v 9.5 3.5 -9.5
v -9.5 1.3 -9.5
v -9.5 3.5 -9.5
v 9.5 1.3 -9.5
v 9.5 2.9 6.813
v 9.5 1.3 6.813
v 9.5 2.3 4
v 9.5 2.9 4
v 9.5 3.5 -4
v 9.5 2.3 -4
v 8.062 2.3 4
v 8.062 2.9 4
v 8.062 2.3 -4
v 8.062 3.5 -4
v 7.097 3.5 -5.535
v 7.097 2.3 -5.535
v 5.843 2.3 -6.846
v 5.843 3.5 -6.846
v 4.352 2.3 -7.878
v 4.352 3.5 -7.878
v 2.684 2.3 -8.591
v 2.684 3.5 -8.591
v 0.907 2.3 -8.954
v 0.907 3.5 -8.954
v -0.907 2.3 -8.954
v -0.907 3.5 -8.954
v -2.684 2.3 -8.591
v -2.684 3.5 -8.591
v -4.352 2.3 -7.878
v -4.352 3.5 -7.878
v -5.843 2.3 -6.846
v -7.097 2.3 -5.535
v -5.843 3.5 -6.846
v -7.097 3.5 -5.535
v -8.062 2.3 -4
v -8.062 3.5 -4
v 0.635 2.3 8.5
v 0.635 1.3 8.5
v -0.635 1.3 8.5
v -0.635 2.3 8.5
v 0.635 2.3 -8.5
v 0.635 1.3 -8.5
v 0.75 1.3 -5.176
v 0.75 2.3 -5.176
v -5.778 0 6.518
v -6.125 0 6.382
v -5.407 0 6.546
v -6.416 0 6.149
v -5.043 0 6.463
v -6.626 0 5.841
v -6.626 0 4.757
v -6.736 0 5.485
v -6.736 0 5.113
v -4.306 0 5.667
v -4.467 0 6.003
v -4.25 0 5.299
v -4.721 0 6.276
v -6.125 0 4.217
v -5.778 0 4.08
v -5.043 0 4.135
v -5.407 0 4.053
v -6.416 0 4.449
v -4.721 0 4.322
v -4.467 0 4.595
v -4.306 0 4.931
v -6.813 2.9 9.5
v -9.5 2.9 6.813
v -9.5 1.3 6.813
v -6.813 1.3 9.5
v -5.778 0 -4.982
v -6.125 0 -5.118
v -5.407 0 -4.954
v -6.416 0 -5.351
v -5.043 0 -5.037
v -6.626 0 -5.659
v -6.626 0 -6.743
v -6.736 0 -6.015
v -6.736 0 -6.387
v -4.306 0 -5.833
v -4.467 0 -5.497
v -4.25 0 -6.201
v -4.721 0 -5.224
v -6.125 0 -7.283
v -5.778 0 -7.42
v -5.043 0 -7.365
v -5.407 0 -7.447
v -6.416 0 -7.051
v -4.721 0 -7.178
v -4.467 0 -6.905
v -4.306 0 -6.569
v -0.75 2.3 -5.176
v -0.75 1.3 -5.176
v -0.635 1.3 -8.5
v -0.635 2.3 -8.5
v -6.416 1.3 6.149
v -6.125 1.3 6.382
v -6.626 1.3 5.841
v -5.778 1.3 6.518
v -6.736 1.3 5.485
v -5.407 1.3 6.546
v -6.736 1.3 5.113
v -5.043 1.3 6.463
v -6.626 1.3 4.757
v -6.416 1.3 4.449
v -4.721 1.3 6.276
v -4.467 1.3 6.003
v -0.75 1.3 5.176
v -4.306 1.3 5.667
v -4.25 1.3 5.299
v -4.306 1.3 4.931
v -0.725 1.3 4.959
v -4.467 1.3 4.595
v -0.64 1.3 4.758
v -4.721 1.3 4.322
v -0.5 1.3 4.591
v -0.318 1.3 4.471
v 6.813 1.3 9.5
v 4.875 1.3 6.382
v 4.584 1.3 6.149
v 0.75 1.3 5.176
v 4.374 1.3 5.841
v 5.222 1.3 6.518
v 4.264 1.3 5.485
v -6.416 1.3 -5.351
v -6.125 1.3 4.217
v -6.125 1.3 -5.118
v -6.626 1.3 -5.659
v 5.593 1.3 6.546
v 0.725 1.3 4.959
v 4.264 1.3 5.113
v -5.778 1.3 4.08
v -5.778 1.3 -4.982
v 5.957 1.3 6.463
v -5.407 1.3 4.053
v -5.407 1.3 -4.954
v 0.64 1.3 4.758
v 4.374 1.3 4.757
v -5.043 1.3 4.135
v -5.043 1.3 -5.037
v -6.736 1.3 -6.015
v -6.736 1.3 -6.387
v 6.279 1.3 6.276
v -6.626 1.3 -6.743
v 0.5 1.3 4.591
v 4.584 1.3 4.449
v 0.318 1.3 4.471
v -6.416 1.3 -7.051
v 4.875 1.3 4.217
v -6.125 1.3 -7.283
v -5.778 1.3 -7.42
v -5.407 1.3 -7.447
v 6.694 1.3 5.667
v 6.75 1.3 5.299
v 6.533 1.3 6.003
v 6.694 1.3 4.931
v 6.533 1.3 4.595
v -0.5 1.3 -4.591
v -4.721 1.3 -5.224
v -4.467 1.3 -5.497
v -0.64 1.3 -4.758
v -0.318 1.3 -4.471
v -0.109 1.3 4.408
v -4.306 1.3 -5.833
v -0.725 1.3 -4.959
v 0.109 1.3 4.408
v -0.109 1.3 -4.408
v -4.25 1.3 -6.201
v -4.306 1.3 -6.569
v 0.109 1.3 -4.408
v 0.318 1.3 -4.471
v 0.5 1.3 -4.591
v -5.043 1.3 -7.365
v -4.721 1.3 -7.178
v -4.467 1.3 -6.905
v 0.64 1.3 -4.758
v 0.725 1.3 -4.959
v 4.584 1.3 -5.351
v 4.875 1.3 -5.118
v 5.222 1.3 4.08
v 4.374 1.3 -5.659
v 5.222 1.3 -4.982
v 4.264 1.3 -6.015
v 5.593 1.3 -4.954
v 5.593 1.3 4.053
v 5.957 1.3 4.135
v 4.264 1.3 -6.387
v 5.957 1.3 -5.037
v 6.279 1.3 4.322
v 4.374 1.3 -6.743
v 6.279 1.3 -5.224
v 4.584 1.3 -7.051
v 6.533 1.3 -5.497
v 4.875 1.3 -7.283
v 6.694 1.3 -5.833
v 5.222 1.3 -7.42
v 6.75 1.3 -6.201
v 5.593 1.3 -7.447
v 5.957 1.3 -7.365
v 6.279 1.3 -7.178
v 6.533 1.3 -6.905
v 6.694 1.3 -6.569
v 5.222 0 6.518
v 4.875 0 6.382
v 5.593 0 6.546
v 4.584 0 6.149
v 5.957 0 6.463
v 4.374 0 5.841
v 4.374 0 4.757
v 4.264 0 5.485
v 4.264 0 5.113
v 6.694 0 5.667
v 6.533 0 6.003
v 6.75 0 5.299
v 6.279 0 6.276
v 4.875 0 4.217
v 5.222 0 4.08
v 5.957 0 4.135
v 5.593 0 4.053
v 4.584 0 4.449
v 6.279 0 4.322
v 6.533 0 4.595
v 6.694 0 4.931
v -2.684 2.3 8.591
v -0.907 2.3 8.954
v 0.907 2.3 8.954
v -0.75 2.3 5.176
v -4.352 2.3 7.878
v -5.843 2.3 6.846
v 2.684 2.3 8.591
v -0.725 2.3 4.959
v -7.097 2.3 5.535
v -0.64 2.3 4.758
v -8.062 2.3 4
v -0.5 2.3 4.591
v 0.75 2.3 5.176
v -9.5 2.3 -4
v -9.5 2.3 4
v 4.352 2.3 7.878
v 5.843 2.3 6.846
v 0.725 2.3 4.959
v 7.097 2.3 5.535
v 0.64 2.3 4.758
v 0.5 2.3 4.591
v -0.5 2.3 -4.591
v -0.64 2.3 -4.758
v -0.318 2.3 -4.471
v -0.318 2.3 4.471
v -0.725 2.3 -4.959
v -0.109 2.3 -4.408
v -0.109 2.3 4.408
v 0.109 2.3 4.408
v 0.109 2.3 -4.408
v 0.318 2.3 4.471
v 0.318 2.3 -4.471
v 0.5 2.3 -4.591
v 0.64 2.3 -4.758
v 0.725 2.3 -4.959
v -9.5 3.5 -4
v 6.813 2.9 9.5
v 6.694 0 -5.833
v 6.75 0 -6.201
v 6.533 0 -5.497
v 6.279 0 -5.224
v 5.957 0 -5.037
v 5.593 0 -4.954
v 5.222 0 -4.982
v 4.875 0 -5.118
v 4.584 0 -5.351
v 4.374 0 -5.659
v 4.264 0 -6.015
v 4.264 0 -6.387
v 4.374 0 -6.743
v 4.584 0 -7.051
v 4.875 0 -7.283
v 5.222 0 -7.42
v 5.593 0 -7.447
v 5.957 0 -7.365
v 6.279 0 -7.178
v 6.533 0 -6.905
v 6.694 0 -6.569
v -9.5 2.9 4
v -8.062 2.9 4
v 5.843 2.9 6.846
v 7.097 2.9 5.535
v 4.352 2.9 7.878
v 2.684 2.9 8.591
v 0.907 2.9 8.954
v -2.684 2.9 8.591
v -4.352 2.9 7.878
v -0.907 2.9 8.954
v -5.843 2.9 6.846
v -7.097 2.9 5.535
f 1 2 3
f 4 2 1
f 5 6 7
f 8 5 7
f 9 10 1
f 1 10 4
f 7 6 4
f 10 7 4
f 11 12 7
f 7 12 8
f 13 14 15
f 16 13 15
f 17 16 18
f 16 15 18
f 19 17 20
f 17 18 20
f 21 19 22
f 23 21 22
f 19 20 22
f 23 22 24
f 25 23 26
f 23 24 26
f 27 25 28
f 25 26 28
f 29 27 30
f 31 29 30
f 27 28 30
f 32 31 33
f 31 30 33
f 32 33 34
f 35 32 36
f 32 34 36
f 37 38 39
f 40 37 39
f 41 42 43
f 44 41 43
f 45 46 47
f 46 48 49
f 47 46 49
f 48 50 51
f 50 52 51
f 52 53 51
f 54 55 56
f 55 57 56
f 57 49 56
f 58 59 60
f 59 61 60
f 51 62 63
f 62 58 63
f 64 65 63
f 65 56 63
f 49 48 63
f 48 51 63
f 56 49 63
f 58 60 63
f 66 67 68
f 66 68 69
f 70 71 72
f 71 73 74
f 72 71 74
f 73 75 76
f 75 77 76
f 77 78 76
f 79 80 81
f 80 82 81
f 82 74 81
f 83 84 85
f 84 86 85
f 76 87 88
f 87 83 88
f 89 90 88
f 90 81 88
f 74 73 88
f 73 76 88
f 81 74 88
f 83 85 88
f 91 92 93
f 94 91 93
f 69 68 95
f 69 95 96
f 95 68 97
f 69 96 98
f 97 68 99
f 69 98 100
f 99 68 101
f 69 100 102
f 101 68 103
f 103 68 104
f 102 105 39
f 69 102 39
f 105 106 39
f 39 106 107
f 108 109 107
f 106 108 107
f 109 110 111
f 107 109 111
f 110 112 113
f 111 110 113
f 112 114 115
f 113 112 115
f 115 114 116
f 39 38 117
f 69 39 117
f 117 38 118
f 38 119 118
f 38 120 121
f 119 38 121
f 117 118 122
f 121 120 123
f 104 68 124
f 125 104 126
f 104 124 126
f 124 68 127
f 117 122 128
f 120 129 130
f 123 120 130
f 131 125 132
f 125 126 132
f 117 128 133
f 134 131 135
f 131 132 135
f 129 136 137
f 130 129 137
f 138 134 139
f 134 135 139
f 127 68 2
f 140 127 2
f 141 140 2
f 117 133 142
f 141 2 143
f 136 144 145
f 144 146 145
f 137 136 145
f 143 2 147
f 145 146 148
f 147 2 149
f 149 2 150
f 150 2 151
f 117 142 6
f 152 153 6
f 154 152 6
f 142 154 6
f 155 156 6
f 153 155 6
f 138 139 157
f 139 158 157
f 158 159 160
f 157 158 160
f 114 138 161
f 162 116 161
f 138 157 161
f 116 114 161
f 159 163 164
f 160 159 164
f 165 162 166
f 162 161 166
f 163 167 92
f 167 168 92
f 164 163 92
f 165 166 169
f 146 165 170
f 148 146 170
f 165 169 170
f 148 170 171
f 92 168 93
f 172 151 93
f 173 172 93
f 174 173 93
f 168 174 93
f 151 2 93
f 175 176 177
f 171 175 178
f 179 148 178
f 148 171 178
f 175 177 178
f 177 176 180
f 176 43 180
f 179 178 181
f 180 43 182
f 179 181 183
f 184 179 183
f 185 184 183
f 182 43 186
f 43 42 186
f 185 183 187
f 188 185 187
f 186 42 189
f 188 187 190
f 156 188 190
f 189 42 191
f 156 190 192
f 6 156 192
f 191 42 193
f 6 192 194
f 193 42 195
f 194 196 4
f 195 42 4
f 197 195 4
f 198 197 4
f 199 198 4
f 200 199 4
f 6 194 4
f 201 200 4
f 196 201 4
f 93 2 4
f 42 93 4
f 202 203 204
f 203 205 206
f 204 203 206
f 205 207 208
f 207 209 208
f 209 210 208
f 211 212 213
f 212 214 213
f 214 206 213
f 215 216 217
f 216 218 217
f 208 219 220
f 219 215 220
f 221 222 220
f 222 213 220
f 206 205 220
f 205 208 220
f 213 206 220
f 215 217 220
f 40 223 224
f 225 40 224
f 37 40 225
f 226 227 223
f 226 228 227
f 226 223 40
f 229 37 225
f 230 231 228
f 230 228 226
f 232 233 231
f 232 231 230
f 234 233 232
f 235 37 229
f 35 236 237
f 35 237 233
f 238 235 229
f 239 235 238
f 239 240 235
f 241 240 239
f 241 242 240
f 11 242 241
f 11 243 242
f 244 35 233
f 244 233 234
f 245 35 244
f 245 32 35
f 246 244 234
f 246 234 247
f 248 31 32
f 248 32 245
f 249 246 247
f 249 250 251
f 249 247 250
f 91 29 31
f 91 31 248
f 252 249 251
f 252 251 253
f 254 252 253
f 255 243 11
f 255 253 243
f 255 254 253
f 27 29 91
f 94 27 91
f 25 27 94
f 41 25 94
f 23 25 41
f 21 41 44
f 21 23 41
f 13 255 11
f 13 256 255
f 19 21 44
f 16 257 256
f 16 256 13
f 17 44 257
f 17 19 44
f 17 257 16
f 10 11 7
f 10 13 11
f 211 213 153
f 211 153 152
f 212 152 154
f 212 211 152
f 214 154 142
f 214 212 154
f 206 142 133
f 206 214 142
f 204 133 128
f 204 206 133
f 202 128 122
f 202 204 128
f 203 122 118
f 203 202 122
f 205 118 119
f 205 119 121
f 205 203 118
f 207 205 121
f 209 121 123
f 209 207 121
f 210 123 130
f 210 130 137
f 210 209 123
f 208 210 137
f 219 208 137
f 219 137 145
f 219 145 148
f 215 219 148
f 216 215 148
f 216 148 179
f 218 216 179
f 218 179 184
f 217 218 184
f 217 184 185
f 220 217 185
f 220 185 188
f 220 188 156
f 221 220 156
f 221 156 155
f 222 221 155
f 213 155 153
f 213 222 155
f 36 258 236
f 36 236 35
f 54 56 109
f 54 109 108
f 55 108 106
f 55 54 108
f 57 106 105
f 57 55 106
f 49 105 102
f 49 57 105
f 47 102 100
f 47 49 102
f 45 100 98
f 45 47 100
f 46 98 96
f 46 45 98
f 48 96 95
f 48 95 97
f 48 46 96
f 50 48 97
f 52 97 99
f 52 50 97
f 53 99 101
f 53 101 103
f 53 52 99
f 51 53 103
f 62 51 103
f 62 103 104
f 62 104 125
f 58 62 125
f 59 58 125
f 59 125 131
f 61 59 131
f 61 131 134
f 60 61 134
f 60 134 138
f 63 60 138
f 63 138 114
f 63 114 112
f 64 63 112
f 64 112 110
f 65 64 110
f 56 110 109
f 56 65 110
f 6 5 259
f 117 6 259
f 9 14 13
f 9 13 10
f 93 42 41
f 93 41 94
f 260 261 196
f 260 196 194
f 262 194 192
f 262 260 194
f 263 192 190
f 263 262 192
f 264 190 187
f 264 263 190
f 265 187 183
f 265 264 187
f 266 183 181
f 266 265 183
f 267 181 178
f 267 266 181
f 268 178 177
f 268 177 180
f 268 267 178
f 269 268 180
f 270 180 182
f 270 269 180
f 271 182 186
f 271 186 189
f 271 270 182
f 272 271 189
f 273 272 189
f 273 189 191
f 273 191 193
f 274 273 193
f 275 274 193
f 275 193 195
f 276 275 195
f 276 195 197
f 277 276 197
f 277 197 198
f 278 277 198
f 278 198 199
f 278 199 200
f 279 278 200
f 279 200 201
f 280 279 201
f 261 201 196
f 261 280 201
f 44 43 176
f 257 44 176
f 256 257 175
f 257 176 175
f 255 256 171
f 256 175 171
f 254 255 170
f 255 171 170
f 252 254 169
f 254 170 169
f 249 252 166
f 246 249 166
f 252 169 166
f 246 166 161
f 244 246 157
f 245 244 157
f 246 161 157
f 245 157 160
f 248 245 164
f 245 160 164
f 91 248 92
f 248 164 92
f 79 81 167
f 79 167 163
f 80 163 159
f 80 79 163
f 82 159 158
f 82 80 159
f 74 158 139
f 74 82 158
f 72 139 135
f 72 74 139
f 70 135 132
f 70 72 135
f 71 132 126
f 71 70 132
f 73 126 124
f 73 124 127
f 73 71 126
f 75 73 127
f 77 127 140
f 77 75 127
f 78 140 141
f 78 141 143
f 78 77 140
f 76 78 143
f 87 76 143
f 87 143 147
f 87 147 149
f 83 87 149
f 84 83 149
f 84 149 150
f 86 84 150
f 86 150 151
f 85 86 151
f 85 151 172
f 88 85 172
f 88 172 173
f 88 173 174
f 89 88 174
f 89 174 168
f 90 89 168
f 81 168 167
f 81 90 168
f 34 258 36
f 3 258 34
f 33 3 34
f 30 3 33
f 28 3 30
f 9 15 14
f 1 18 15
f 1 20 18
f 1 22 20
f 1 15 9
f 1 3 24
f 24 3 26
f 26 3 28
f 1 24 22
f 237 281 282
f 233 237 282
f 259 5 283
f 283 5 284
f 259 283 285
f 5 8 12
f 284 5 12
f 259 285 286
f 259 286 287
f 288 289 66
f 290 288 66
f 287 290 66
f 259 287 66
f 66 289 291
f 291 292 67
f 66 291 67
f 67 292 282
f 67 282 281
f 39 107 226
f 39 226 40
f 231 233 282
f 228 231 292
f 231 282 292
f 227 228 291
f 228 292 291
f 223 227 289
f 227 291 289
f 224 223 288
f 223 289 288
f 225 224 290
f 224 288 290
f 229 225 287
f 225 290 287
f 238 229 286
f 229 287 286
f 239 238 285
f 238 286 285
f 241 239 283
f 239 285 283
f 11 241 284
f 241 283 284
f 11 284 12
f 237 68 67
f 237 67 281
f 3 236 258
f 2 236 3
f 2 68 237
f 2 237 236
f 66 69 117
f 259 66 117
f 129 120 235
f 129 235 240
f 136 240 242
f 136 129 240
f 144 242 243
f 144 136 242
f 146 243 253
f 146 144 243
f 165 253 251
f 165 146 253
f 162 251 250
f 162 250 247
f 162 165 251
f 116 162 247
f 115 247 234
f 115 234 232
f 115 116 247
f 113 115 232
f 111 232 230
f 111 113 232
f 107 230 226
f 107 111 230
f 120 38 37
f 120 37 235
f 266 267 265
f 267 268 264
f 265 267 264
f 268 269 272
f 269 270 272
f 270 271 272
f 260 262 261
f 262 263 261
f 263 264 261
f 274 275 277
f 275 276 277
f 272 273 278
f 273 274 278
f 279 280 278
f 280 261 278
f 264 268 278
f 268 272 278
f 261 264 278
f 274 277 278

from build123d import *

# Parameters (mm, degrees)
SKETCH1_W           = 19
SKETCH1_H           = 19
BOSS_EXTRUDE1_DEPTH = 3.5
CUT_EXTRUDE1_DEPTH  = 4.5
CUT_EXTRUDE2_DEPTH  = 0.6
SKETCH5_W           = 19
SKETCH5_H           = 8
CUT_EXTRUDE3_DEPTH  = 0.6
SKETCH6_R           = 9
CUT_EXTRUDE4_DEPTH  = 1.2
SKETCH7_OUTSIDE_W   = 26.42
SKETCH7_OUTSIDE_H   = 26.42
SKETCH7_OUTSIDE_R   = 1.25
CUT_EXTRUDE5_DEPTH  = 1.3
CUT_EXTRUDE6_DEPTH  = 1
BOSS_EXTRUDE4_DEPTH = 1


with BuildPart() as part:
    # Sketch1 → Boss-Extrude1 (new body)
    with BuildSketch(Plane(origin=(0, 0, 0), x_dir=(1, 0, 0), z_dir=(0, 1, 0))):
        Rectangle(SKETCH1_W, SKETCH1_H)
    extrude(amount=BOSS_EXTRUDE1_DEPTH)

    # Sketch2 → Cut-Extrude1 (cut, through all)
    with BuildSketch(Plane(origin=(0, 3.5, 0), x_dir=(1, 0, 0), z_dir=(0, 1, 0))):
        Polygon((-9.5, -6.812994231), (-6.812994231, -9.5), (-9.5, -9.5), align=None)
    cut_extrude1 = extrude(amount=-CUT_EXTRUDE1_DEPTH, mode=Mode.SUBTRACT)

    # Mirror1: Cut-Extrude1 across plane
    add(cut_extrude1.mirror(Plane(origin=(0, 0, 0), x_dir=(0, 0, 1), z_dir=(1, 0, 0))), mode=Mode.SUBTRACT)

    # Sketch3 → Cut-Extrude2 (cut)
    with BuildSketch(Plane(origin=(0, 3.5, 0), x_dir=(1, 0, 0), z_dir=(0, 1, 0))):
        Polygon((-9.5, 4), (9.5, 4), (9.5, -6.812994231), (6.812994231, -9.5), (-6.812994231, -9.5), (-9.5, -6.812994231), align=None)
    extrude(amount=-CUT_EXTRUDE2_DEPTH, mode=Mode.SUBTRACT)

    # Sketch5 → Cut-Extrude3 (cut)
    with BuildSketch(Plane(origin=(0, 2.9, 0), x_dir=(1, 0, 0), z_dir=(0, 1, 0))):
        Rectangle(SKETCH5_W, SKETCH5_H)
    extrude(amount=-CUT_EXTRUDE3_DEPTH, mode=Mode.SUBTRACT)

    # Sketch6 → Cut-Extrude4 (cut)
    with BuildSketch(Plane(origin=(0, 3.5, 0), x_dir=(1, 0, 0), z_dir=(0, 1, 0))):
        Circle(SKETCH6_R)
    extrude(amount=-CUT_EXTRUDE4_DEPTH, mode=Mode.SUBTRACT)

    # Sketch7 outside → Cut-Extrude5 (cut)
    with BuildSketch(Plane.XZ):
        Rectangle(SKETCH7_OUTSIDE_W, SKETCH7_OUTSIDE_H)
        with Locations((-5.5, -6.20094747)):
            Circle(SKETCH7_OUTSIDE_R, mode=Mode.SUBTRACT)
        with Locations((-5.5, 5.29905253)):
            Circle(SKETCH7_OUTSIDE_R, mode=Mode.SUBTRACT)
        with Locations((5.5, 5.29905253)):
            Circle(SKETCH7_OUTSIDE_R, mode=Mode.SUBTRACT)
        with Locations((5.5, -6.20094747)):
            Circle(SKETCH7_OUTSIDE_R, mode=Mode.SUBTRACT)
    extrude(amount=-CUT_EXTRUDE5_DEPTH, mode=Mode.SUBTRACT)

    # Sketch8 → Cut-Extrude6 (cut)
    with BuildSketch(Plane.XZ.offset(-1.3)):
        with BuildLine():
            Line((-0.6, -9.5), (0.6, -9.5))
            Line((0.6, -9.5), (0.749551834, -5.175923885))
            ThreePointArc((0.749551834, -5.175923885), (0, -4.4), (-0.749551834, -5.175923885))
            Line((-0.749551834, -5.175923885), (-0.6, -9.5))
        make_face()
    cut_extrude6 = extrude(amount=-CUT_EXTRUDE6_DEPTH, mode=Mode.SUBTRACT)

    # Mirror2: Cut-Extrude6 across plane
    add(cut_extrude6.mirror(Plane.XY), mode=Mode.SUBTRACT)

    # Sketch11 → Boss-Extrude4 (add)
    with BuildSketch(Plane.XZ.offset(-1.3)):
        Polygon((-0.6, -9.5), (0.6, -9.5), (0.634585847, -8.5), (-0.634585847, -8.5), align=None)
    boss_extrude4 = extrude(amount=-BOSS_EXTRUDE4_DEPTH)

    # Mirror3: Boss-Extrude4 across plane
    add(boss_extrude4.mirror(Plane.XY))


solid = part.part
